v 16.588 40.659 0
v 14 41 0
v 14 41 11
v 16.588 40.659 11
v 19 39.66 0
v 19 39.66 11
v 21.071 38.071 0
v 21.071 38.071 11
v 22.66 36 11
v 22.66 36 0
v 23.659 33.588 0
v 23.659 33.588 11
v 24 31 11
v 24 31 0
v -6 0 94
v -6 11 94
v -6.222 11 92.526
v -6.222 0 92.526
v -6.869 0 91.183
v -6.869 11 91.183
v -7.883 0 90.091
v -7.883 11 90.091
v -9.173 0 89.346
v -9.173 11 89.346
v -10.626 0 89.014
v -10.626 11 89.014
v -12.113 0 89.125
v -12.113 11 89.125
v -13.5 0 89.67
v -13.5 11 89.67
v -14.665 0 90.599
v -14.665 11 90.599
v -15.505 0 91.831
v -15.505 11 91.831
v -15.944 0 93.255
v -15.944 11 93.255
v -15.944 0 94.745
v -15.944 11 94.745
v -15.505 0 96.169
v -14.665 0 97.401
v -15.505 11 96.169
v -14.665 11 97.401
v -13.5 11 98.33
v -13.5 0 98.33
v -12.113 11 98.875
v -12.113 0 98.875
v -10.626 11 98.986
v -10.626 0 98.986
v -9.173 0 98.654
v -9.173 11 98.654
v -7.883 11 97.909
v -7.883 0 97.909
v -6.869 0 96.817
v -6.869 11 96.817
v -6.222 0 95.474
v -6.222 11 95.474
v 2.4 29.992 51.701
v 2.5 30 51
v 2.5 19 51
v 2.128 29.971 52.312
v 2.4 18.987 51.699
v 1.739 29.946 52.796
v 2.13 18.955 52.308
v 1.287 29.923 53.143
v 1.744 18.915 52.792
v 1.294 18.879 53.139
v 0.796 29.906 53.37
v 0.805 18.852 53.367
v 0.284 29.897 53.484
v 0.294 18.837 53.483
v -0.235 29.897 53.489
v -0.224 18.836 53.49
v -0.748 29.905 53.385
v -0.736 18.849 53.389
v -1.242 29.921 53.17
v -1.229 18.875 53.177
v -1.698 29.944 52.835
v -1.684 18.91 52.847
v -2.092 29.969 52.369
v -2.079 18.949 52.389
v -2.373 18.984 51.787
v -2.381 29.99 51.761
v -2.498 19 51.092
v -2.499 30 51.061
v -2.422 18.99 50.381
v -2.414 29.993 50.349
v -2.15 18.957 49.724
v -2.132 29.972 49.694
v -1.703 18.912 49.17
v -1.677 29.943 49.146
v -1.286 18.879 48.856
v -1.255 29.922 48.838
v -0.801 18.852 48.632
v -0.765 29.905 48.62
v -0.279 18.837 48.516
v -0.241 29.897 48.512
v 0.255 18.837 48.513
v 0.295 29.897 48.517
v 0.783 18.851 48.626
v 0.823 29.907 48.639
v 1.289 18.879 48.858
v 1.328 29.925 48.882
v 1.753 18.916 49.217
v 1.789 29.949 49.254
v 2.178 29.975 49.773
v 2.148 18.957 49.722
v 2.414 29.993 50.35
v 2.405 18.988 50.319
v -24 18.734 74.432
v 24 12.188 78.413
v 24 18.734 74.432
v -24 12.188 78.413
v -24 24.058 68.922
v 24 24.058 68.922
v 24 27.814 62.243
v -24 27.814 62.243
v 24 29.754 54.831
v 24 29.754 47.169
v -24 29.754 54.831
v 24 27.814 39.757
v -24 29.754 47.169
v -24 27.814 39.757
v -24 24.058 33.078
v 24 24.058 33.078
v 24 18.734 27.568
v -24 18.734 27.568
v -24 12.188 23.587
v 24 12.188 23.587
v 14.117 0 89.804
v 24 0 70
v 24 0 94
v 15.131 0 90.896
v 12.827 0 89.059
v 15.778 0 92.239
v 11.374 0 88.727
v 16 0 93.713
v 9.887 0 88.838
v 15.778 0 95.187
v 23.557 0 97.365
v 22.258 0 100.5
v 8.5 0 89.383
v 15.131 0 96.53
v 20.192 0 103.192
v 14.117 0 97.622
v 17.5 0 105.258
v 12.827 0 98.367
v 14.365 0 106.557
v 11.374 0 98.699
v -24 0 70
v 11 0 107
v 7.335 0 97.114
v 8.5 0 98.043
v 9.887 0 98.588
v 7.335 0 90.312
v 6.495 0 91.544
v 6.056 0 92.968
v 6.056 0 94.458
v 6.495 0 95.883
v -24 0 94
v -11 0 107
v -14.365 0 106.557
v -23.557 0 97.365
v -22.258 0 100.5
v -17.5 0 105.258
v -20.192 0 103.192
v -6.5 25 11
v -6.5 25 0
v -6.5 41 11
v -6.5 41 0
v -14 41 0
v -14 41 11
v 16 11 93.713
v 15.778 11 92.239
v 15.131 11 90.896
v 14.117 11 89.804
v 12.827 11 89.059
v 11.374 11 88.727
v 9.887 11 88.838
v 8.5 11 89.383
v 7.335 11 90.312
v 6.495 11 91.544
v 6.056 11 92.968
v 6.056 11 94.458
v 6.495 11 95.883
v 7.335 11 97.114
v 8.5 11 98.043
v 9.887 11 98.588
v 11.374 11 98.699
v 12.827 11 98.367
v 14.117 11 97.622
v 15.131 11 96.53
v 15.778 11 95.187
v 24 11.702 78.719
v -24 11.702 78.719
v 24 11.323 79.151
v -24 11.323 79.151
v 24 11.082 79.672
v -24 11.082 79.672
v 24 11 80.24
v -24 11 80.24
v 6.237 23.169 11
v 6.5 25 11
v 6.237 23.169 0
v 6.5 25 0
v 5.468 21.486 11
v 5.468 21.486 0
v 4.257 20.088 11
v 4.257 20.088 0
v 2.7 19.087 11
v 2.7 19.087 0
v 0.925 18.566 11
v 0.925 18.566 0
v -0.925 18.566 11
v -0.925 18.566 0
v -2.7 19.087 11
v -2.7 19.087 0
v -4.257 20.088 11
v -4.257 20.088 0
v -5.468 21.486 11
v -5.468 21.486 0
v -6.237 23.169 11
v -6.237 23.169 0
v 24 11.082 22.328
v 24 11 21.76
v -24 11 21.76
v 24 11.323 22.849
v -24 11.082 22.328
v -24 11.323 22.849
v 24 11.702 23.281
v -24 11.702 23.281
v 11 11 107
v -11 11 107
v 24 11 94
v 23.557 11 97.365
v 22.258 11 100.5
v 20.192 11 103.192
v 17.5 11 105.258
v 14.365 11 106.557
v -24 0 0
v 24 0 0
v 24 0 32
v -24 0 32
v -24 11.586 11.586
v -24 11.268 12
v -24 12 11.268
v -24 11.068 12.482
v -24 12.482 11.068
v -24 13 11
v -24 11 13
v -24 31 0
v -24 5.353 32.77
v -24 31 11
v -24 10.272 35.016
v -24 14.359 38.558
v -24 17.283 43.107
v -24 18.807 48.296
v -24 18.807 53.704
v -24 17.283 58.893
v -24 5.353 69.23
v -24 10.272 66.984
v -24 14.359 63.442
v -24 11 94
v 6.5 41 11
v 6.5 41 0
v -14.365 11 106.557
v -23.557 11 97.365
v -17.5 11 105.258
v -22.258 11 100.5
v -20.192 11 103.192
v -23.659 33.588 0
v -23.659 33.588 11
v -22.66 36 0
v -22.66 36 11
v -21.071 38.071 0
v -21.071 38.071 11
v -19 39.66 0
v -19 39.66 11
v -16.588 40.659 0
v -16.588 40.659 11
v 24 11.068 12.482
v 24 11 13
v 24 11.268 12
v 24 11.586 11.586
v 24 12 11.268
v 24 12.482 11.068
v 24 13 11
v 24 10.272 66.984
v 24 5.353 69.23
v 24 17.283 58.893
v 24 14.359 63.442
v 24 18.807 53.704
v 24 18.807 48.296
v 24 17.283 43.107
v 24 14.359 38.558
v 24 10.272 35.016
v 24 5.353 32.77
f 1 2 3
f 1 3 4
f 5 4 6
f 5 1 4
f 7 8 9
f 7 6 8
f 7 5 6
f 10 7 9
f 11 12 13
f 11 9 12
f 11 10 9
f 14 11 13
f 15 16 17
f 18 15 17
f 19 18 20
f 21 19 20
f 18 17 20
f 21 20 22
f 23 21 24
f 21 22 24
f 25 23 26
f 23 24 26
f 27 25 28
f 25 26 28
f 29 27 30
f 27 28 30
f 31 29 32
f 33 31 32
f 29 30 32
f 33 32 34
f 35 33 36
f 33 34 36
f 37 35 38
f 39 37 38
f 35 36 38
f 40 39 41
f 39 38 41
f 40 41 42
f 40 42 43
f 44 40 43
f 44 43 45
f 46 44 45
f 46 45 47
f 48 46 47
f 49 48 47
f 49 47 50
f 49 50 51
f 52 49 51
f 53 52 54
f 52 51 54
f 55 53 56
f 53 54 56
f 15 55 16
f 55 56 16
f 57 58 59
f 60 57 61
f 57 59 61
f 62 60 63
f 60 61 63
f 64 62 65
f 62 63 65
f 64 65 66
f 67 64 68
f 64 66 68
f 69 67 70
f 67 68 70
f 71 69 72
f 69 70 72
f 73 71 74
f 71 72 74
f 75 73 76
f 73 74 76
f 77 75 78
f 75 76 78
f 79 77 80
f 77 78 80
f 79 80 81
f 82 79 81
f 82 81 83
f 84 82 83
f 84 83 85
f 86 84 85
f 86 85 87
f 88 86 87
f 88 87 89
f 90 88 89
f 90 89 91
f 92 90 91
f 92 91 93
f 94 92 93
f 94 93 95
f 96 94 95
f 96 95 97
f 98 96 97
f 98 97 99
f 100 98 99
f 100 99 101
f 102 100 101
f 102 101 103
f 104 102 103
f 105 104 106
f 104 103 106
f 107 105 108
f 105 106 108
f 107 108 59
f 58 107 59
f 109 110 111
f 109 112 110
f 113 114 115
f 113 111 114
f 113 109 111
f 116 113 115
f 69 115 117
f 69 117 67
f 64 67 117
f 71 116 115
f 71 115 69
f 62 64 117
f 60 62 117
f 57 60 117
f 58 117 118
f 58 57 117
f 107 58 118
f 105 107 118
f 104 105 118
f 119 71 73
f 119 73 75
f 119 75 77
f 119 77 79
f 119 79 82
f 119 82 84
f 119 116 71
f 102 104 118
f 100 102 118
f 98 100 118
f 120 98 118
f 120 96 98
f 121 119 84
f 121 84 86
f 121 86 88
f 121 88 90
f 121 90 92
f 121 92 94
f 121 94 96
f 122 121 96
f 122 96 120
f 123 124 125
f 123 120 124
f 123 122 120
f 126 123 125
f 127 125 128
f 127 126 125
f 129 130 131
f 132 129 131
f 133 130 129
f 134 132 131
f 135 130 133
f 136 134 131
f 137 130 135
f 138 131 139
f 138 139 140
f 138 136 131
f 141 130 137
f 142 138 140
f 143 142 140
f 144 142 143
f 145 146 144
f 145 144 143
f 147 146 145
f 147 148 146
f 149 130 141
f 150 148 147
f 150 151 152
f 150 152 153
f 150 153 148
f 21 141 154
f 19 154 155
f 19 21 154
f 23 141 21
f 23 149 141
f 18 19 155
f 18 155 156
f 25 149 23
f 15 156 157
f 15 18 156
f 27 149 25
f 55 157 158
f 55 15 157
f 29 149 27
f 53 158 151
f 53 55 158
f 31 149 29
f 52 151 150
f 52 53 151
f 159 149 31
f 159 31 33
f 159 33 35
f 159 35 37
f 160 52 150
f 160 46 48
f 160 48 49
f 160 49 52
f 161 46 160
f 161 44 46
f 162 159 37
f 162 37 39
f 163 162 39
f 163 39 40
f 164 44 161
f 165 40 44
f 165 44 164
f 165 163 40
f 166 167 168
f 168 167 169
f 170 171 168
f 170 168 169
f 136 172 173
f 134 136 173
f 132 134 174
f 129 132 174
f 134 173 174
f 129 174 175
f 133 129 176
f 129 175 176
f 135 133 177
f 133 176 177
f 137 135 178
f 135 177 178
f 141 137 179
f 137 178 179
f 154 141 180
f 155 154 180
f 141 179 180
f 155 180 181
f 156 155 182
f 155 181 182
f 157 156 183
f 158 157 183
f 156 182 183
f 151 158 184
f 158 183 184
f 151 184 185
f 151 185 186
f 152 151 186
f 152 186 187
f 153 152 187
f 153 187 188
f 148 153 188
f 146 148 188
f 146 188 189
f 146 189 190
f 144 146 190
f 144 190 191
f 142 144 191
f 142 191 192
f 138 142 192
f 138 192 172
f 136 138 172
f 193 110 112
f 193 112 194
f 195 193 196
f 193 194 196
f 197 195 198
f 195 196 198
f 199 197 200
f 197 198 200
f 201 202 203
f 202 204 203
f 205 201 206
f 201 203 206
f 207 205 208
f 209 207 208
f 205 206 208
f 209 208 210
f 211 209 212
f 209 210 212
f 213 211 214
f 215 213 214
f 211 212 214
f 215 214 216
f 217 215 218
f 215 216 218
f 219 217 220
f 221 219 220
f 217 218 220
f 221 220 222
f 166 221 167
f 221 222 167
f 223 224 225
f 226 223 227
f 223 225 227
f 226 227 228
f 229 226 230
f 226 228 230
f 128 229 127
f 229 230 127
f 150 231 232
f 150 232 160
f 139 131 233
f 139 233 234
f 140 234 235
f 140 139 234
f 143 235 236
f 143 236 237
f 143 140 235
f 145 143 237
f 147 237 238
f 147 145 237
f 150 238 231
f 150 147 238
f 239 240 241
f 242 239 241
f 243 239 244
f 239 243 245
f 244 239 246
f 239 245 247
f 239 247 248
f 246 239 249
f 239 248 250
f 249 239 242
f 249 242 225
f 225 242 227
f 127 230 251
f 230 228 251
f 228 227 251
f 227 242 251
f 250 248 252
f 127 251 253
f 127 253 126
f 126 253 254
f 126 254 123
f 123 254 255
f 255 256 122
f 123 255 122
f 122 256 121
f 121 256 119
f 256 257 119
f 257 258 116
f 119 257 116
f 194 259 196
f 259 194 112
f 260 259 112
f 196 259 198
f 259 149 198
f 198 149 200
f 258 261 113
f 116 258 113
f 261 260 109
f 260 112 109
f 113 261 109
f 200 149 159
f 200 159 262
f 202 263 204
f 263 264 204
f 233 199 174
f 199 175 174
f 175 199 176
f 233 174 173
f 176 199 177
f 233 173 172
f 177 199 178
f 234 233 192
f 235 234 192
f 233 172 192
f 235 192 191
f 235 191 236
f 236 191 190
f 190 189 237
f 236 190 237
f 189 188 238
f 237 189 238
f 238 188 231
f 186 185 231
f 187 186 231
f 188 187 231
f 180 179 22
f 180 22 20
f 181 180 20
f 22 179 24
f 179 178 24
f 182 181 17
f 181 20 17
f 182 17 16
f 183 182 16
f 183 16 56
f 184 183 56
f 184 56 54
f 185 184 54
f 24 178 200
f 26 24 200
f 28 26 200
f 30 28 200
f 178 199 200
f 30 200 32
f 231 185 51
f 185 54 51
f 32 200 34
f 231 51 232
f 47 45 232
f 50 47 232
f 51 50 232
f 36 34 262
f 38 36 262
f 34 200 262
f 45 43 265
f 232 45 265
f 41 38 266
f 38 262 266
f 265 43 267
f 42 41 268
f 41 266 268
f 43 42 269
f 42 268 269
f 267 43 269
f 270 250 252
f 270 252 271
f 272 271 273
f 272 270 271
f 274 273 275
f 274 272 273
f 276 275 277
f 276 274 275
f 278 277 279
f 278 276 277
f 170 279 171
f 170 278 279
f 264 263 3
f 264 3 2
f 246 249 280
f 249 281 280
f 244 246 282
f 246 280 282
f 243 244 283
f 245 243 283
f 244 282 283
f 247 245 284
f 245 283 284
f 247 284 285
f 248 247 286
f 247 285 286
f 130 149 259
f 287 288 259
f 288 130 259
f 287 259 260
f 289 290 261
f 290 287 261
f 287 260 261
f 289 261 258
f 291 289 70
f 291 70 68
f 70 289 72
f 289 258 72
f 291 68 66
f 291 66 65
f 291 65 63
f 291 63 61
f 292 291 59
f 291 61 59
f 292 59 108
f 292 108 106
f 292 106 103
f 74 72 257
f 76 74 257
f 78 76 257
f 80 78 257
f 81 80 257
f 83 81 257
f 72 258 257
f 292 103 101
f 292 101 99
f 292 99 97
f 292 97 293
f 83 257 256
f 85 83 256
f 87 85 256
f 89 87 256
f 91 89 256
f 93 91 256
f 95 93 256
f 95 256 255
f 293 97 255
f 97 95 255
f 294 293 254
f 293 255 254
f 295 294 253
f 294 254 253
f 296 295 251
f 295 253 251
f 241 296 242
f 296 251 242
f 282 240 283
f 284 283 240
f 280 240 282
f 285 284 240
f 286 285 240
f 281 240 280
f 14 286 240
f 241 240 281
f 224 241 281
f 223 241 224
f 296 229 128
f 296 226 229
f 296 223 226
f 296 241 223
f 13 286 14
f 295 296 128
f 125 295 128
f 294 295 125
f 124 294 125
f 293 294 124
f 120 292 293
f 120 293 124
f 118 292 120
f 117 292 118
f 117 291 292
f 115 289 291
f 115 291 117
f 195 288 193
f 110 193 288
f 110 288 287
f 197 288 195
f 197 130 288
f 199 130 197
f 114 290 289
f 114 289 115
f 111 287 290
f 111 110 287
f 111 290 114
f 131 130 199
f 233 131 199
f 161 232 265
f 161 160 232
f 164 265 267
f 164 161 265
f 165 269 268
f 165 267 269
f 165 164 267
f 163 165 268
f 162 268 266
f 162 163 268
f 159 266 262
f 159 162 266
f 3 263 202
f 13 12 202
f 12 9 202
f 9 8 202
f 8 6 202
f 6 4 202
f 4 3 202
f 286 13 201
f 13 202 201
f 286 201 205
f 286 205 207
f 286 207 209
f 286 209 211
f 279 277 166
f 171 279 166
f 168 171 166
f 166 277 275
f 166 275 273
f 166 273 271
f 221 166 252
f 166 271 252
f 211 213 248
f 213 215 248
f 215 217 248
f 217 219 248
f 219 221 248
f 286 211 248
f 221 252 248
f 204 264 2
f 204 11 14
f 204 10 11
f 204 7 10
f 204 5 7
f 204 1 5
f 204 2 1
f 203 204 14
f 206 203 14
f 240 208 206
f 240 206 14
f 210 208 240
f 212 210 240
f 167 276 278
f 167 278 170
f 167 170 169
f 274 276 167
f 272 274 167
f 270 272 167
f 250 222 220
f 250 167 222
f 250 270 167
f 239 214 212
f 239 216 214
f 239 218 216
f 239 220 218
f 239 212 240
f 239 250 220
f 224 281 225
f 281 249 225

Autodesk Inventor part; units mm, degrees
ref_plane "YZ Plane" through (0, 0, 0) normal (1, 0, 0) x (0, 1, 0)
ref_plane "XZ Plane" through (0, 0, 0) normal (0, 1, 0) x (-1, 0, 0)
ref_plane "XY Plane" through (0, 0, 0) normal (0, 0, 1) x (1, 0, 0)
sketch "Sketch1" plane through (0, 0, 0) normal (1, 0, 0) x (0, 1, 0)
  line L0 (41, 0) -> (0, 0)
  line L1 (0, 0) -> (0, 32)
  arc A0 (0, 32) -> (0, 70) centre (0, 51) ccw
  line L2 (0, 70) -> (0, 107)
  line L3 (41, 11) -> (11, 11)
  line L4 (11, 11) -> (11, 23.0894)
  arc A1 (11, 23.0894) -> (11, 78.9106) centre (0, 51) ccw
  line L5 (11, 78.9106) -> (11, 107)
  line L6 (11, 107) -> (0, 107)
  line L7 (41, 11) -> (41, 0)
  dimension "d0" = 41
  dimension "d1" = 107
  dimension "d2" = 51
  dimension "d3" = 11
  dimension "d4" = 30
extrude "Extrusion1" add sketch "Sketch1" along normal mid plane 48
fillet "Fillet1" radius 13 2 edges at (24, 5.5, 107) (-24, 5.5, 107)
fillet "Fillet2" radius 2 3 edges at (0, 11, 78.9106) (0, 11, 23.0894) (0, 11, 11)
sketch "Sketch2" plane through (-11, 11, 107) normal (0, 1, 0) x (1, 0, 0)
  arc A0 (-13, 13) -> (0, 0) centre (0, 13) ccw projected
  circle A1 centre (0, 13) radius 5
  circle A2 centre (22, 13.2869) radius 5
  point P0 (11, 107)
  dimension "d9" = 10
  dimension "d10" = 10
extrude "Extrusion2" cut sketch "Sketch2" against normal through all
sketch "Sketch3" plane through (24, 41, 0) normal (0, 0, -1) x (-1, 0, 0)
  line L0 (48, 0) -> (0, 0) projected
  line L1 (24, 0) -> (24, -16) construction
  line L2 (30.5, 0) -> (17.5, 0)
  line L3 (17.5, 0) -> (17.5, -16)
  line L4 (30.5, -16) -> (30.5, 0)
  arc A0 (17.5, -16) -> (30.5, -16) centre (24, -16) ccw
  point P0 (24, -41)
  dimension "d14" = 13
  dimension "d15" = 6.5
  dimension "d16" = 16
  dimension "d17" = 6.5
extrude "Extrusion3" cut sketch "Sketch3" against normal blind 11
fillet "Fillet3" radius 10 2 edges at (24, 41, 5.5) (-24, 41, 5.5)
sketch "Sketch4" plane through (-24, 0, 0) normal (0, -1, 0) x (1, 0, 0)
  line L0 (48, 70) -> (48, 32) projected
  line L1 (48, 51) -> (0, 51)
  line L2 (0, 78.4129) -> (0, 23.5871) projected
  circle A0 centre (24, 51) radius 2.5
  point P0 (24, 0)
  dimension "d21" = 5
extrude "Extrusion4" cut sketch "Sketch4" against normal through all
thread "Thread1" size "M5x0.8" class "6H" standard "ISO Metric profile" full length
properties part number "T05"
